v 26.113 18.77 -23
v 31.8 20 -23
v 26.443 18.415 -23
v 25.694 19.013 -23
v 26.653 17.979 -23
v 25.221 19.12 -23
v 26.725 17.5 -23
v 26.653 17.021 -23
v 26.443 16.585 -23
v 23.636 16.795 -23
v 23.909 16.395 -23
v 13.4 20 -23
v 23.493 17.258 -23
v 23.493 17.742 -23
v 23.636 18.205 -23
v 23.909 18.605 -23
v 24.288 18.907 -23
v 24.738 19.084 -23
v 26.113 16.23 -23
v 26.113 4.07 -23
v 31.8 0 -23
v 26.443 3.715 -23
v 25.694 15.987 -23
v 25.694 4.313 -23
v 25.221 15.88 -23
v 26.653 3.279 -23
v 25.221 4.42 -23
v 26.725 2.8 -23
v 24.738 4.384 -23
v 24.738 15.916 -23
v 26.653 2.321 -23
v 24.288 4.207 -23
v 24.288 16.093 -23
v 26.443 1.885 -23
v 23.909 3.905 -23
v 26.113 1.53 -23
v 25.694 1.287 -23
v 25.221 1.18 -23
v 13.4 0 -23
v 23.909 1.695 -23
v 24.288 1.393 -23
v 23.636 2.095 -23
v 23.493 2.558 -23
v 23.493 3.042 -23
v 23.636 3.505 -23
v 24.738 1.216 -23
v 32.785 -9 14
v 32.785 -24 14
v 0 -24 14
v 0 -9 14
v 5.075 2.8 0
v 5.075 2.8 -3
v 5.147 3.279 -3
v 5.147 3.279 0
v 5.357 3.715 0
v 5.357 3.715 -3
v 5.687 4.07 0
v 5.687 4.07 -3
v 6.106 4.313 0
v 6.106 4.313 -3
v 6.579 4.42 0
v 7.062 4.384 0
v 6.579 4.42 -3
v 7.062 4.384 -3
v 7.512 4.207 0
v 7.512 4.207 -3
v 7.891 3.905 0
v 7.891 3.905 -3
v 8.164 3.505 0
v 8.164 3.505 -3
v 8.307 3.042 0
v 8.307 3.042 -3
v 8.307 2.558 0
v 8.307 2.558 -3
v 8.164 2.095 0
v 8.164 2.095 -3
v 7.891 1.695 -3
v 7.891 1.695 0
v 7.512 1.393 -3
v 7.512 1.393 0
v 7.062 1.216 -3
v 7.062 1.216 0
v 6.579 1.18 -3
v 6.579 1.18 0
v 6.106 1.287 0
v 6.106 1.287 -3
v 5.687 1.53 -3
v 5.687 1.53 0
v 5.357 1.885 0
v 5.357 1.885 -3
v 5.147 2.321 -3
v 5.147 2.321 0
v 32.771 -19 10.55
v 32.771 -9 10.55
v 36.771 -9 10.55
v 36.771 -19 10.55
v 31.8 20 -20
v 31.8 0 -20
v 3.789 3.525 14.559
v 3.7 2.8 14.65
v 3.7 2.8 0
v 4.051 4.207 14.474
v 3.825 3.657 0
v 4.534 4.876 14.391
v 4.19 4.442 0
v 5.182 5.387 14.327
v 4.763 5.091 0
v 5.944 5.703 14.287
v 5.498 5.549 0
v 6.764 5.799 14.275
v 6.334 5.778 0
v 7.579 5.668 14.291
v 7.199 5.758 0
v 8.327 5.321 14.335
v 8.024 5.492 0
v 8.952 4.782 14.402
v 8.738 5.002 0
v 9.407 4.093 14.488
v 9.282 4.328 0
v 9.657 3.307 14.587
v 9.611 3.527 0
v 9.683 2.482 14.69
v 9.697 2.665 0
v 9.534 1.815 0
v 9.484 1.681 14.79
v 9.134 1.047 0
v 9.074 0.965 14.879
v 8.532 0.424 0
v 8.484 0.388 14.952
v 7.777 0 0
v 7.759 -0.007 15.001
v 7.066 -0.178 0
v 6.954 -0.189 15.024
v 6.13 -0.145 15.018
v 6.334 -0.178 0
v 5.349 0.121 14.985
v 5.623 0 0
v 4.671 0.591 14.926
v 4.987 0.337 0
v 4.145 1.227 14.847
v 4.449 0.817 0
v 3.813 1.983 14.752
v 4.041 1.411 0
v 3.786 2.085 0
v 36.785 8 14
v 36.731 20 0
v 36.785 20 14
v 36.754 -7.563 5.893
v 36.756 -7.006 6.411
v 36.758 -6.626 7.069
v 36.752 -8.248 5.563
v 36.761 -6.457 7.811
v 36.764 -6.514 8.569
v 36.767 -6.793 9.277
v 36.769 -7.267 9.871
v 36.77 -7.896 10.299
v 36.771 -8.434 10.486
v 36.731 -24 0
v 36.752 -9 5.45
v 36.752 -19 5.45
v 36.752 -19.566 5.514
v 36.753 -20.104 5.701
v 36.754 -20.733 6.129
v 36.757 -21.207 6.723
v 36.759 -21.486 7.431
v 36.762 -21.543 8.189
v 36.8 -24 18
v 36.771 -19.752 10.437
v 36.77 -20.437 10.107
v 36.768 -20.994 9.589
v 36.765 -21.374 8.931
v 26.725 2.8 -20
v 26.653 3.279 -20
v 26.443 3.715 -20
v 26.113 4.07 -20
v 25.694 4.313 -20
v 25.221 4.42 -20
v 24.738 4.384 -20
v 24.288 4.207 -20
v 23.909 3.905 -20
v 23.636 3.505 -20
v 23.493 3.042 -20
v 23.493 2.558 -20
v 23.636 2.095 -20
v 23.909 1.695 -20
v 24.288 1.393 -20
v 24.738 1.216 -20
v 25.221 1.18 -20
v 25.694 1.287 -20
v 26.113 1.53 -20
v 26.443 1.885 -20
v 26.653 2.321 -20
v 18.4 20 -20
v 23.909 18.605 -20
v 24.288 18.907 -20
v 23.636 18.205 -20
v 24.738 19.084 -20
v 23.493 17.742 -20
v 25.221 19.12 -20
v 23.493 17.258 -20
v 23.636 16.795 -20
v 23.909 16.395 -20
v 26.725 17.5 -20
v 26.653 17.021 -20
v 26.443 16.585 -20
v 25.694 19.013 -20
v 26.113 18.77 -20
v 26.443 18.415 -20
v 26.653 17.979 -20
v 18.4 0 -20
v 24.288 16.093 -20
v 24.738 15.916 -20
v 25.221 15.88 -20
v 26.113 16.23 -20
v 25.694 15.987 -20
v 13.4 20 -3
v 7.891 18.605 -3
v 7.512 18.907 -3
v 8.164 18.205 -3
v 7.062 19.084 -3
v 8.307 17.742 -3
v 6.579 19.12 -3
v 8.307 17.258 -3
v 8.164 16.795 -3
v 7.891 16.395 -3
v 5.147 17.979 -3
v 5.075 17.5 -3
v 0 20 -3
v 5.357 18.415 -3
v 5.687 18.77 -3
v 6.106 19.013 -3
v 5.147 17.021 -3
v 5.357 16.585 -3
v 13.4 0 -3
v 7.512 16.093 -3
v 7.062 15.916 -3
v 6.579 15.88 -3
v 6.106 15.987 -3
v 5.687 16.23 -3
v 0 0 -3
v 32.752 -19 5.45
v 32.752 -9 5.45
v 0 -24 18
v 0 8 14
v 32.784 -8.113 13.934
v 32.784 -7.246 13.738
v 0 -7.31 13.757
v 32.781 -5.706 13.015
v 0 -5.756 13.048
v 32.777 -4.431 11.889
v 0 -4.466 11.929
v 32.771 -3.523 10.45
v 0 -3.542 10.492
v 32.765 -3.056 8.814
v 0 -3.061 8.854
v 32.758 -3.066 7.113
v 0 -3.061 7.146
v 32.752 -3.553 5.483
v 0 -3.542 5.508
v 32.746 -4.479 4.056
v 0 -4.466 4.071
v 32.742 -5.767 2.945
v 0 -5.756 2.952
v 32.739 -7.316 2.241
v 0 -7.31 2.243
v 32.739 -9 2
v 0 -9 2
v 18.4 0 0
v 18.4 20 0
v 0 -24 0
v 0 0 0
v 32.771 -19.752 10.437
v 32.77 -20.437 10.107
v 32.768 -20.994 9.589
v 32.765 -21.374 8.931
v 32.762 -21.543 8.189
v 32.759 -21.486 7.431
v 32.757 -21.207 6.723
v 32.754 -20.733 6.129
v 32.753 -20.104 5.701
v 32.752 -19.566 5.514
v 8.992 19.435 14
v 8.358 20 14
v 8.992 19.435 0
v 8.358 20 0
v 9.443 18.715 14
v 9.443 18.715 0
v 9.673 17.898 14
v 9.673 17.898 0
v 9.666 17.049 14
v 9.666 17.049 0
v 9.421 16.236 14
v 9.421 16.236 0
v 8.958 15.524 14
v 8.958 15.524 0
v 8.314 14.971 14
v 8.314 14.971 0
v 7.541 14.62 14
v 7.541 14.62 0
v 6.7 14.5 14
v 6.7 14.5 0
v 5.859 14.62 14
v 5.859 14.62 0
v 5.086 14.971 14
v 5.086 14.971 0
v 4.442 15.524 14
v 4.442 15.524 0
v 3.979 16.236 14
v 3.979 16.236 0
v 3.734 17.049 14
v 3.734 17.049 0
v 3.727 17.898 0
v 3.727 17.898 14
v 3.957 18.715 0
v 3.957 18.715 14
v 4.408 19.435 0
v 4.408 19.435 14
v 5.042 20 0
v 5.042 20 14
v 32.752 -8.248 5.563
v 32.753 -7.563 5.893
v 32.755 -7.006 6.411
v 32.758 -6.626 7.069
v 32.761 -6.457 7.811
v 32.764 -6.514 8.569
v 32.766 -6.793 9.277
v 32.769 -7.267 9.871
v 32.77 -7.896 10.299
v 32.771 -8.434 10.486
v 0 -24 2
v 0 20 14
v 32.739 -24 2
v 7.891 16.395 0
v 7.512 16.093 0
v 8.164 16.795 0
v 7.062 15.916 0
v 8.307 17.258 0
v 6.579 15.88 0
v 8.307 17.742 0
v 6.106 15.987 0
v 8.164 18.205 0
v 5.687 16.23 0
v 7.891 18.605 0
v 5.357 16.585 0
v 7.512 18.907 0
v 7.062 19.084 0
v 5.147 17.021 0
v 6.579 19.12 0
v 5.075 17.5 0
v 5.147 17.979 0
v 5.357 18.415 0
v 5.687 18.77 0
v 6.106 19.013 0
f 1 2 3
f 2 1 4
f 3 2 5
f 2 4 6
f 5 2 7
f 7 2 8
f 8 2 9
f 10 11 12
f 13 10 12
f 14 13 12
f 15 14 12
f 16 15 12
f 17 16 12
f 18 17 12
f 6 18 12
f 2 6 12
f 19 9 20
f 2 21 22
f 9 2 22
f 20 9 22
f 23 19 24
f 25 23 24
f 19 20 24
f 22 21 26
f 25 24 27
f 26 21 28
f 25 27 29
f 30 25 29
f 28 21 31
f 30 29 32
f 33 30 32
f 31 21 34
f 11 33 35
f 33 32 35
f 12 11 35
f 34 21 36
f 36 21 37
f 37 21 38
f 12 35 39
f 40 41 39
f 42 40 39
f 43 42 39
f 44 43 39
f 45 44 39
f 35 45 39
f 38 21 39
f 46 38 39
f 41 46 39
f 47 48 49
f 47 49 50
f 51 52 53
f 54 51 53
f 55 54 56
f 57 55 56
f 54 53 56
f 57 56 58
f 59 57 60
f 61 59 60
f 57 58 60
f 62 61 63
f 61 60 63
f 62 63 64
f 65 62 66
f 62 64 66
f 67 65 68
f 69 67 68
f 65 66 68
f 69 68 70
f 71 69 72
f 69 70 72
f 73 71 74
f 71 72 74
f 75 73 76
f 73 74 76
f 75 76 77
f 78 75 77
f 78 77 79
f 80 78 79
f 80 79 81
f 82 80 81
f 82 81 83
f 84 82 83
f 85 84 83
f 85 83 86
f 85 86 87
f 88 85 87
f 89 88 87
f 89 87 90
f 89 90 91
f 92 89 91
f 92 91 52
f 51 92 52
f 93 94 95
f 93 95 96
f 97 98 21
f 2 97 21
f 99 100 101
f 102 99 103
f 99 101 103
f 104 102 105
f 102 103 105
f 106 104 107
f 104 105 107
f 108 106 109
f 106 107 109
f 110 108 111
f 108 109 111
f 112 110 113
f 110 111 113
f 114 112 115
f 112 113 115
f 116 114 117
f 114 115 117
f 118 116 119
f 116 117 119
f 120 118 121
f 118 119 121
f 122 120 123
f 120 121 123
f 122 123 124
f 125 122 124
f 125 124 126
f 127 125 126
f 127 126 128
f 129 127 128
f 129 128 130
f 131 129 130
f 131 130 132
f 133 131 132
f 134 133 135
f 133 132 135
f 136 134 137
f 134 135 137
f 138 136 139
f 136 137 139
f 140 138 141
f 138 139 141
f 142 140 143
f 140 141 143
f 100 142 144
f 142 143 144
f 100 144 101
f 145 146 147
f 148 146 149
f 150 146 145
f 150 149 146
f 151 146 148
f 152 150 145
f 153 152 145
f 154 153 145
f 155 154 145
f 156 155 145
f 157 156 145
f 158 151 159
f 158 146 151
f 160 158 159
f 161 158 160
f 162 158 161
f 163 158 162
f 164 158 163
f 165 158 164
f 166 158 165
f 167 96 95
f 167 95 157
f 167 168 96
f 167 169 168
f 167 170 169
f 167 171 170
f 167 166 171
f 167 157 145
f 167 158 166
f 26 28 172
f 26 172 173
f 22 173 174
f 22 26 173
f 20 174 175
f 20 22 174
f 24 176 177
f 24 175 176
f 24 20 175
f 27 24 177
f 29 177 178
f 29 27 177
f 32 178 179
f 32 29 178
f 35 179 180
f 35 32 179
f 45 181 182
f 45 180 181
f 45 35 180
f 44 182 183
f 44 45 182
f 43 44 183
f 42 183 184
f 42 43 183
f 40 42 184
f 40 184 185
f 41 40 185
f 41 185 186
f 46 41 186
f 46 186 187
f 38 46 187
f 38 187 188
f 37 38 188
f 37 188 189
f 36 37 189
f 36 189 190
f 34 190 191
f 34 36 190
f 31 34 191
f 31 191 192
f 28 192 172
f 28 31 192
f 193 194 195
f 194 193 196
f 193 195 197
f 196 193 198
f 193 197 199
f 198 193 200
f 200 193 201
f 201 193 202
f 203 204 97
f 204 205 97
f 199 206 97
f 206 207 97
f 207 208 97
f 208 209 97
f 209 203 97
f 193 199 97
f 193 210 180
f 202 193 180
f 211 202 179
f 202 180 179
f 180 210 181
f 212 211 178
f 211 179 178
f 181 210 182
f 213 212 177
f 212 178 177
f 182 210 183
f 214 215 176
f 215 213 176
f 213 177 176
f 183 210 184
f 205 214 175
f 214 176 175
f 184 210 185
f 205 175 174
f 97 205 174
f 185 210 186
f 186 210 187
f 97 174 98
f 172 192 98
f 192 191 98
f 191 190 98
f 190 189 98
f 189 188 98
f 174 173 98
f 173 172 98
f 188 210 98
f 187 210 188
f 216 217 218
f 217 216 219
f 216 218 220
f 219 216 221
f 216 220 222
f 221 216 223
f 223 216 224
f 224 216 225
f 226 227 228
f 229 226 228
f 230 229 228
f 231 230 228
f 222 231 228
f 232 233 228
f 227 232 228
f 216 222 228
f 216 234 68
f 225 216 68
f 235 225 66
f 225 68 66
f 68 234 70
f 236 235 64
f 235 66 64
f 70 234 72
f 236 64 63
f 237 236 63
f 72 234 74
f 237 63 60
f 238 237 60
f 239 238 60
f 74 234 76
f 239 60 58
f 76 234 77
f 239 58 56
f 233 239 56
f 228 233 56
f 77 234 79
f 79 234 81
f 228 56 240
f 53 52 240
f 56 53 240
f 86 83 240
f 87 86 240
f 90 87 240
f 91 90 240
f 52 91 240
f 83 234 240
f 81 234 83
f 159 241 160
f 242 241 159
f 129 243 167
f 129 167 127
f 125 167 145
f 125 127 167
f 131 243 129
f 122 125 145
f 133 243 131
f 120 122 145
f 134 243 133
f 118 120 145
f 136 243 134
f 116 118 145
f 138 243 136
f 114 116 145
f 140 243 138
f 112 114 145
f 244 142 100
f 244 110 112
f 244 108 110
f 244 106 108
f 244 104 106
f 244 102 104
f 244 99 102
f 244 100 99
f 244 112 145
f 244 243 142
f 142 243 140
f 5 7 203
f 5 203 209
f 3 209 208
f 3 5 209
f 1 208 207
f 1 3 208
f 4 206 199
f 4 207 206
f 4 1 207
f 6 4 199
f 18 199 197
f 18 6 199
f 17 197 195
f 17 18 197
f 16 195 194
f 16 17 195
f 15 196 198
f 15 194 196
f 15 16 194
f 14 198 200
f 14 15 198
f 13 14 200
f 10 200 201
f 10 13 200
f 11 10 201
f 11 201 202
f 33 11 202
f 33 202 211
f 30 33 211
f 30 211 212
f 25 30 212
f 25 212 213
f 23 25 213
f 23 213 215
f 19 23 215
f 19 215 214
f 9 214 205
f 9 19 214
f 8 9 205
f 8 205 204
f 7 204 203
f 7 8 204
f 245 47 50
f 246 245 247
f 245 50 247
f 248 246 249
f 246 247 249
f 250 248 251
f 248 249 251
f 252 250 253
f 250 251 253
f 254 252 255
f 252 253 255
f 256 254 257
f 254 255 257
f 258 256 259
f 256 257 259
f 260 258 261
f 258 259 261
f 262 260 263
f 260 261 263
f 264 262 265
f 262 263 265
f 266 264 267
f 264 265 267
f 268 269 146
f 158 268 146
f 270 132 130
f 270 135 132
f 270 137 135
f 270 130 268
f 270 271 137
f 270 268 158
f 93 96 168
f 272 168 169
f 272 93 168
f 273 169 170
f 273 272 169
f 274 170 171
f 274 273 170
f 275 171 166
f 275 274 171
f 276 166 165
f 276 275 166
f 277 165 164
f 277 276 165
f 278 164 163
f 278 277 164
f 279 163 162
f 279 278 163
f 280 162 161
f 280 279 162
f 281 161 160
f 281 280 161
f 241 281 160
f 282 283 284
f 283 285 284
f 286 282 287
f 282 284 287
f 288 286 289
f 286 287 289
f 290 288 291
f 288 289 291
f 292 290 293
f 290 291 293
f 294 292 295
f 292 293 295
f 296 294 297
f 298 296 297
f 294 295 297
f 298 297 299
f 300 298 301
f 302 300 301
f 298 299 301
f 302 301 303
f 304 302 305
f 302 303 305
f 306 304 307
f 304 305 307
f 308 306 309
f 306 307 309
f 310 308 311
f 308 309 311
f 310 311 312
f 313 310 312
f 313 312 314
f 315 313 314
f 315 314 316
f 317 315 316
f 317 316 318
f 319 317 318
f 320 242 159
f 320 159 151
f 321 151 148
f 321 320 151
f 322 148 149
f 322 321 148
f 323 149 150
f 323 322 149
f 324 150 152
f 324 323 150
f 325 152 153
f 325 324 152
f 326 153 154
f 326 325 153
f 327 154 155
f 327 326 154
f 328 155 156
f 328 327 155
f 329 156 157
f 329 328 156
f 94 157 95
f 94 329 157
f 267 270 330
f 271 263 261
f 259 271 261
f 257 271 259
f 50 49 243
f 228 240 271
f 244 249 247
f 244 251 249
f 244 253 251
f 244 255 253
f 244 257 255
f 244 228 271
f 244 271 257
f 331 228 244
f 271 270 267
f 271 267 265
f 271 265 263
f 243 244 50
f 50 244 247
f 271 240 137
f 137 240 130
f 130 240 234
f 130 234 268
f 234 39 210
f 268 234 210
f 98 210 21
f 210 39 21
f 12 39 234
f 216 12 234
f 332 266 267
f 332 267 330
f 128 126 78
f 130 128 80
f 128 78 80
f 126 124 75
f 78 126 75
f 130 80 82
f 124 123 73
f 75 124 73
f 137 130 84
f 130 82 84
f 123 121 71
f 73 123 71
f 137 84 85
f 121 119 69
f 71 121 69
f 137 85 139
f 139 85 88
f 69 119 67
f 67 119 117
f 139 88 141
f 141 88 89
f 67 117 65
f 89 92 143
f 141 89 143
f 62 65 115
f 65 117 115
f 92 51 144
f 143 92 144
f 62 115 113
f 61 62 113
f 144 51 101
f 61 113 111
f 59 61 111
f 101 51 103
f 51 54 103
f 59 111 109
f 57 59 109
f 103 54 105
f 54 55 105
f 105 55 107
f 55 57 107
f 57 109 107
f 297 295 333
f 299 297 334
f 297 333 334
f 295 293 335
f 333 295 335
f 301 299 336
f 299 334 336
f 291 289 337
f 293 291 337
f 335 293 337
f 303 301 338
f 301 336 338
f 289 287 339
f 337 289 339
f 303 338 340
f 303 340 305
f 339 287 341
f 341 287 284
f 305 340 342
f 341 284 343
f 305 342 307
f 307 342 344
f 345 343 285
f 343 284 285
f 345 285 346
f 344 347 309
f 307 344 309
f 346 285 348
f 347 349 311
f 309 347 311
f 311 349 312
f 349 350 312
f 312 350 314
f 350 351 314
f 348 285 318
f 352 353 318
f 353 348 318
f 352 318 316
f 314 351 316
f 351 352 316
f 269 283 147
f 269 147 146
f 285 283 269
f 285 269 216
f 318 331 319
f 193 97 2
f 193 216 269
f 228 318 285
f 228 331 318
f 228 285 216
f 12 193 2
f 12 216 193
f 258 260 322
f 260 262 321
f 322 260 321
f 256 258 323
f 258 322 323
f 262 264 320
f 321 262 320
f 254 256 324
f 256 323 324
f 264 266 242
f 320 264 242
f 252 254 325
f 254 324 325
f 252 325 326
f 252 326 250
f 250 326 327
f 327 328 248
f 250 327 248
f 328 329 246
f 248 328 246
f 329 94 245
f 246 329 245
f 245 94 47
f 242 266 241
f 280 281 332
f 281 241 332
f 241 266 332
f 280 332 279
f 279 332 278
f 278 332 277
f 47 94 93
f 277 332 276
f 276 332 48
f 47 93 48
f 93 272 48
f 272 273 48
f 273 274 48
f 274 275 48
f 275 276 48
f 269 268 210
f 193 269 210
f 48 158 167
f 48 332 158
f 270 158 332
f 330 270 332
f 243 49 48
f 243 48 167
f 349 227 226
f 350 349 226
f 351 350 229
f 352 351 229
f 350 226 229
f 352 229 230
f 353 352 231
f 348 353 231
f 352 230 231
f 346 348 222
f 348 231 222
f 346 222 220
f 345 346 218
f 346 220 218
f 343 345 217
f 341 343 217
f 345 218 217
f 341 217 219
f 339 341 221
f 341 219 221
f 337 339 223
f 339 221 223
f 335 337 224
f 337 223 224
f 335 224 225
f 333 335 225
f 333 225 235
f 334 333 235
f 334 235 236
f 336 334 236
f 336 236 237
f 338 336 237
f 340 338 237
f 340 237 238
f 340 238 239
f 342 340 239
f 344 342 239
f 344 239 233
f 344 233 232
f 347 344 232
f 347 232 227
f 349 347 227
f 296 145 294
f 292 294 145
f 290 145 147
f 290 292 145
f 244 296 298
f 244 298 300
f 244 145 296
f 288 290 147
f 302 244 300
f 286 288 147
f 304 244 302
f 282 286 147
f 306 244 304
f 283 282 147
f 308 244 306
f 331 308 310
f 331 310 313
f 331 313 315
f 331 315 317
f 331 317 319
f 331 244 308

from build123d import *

# Parameters (mm, degrees)
BOSS_EXTRUDE1_DEPTH              = 20
CUT_EXTRUDE1_START               = -4
SKETCH2_R                        = 1.625
CUT_EXTRUDE1_DEPTH               = 25
BOSS_EXTRUDE2_DEPTH              = 36.8
SKETCH8_R                        = 3
CUT_EXTRUDE5_DEPTH               = 19
CUT_EXTRUDE6_DEPTH               = 45
CUT_EXTRUDE7_REACH               = 42.8
CUT_EXTRUDE7_OFFSET_FROM_SURFACE = 4


with BuildPart() as part:
    # Sketch1 → Boss-Extrude1 (new body)
    with BuildSketch(Plane(origin=(0, 0, 0), x_dir=(1, 0, 0), z_dir=(0, 1, 0))):
        Polygon((0, 0), (18.4, 0), (18.4, 20), (31.8, 20), (31.8, 23), (13.4, 23), (13.4, 3), (0, 3), align=None)
    extrude(amount=BOSS_EXTRUDE1_DEPTH)

    # Sketch2 → Cut-Extrude1 (cut)
    with BuildSketch(Plane.XY.offset(-20).offset(CUT_EXTRUDE1_START)):
        with Locations((25.1, 17.5)):
            Circle(SKETCH2_R)
        with Locations((25.1, 2.8)):
            Circle(SKETCH2_R)
    cut_extrude1 = extrude(amount=CUT_EXTRUDE1_DEPTH, mode=Mode.SUBTRACT)

    # Mirror1: Cut-Extrude1 across plane
    add(cut_extrude1.mirror(Plane.ZY.offset(-15.9)), mode=Mode.SUBTRACT)

    # Sketch5 → Boss-Extrude2 (add)
    with BuildSketch(Plane.ZY):
        Polygon((0, 20), (0, -24), (18, -24), (14, 8), (14, 20), align=None)
        with BuildLine():
            Line((10.55, -9), (10.55, -19))
            ThreePointArc((10.55, -19), (8, -21.55), (5.45, -19))
            Line((5.45, -19), (5.45, -9))
            ThreePointArc((5.45, -9), (8, -6.45), (10.55, -9))
        make_face(mode=Mode.SUBTRACT)
    extrude(amount=-BOSS_EXTRUDE2_DEPTH)

    # Sketch8 → Cut-Extrude5 (cut, through all)
    with BuildSketch(Plane(origin=(0, 0, 0), x_dir=(-1, 0, 0), z_dir=(0, 0, -1))):
        with Locations((-6.7, 2.8)):
            Circle(SKETCH8_R)
        with Locations((-6.7, 17.5)):
            Circle(SKETCH8_R)
    extrude(amount=-CUT_EXTRUDE5_DEPTH, mode=Mode.SUBTRACT)

    # Sketch6 → Cut-Extrude6 (cut, through all)
    with BuildSketch(Plane.XZ.offset(24)):
        Polygon((36.8, 18), (36.8, 0), (36.730884622, 0), align=None)
    extrude(amount=-CUT_EXTRUDE6_DEPTH, mode=Mode.SUBTRACT)

    # Cut-Extrude7: up to this face of the body (flat: up to its plane, moved by the offset)
    cut_extrude7_end = Plane(part.part.faces().sort_by_distance((36.760677184, -1.783418912, 7.75899858))[0]).offset(-CUT_EXTRUDE7_OFFSET_FROM_SURFACE)
    # Sketch7 → Cut-Extrude7 (cut, up to the picked face)
    with BuildSketch(Plane.ZY, mode=Mode.PRIVATE) as cut_extrude7_sk1:
        with BuildLine():
            Line((14, -24), (14, -9))
            ThreePointArc((14, -9), (8, -3), (2, -9))
            Line((2, -9), (2, -24))
            Line((2, -24), (14, -24))
        make_face()
    cut_extrude7_tool1 = split(extrude(cut_extrude7_sk1.sketch, amount=-CUT_EXTRUDE7_REACH, mode=Mode.PRIVATE), bisect_by=cut_extrude7_end, keep=Keep.BOTH, mode=Mode.PRIVATE)
    add(cut_extrude7_tool1.solids().sort_by_distance((0, -14.098317, 8))[0], mode=Mode.SUBTRACT)


solid = part.part
